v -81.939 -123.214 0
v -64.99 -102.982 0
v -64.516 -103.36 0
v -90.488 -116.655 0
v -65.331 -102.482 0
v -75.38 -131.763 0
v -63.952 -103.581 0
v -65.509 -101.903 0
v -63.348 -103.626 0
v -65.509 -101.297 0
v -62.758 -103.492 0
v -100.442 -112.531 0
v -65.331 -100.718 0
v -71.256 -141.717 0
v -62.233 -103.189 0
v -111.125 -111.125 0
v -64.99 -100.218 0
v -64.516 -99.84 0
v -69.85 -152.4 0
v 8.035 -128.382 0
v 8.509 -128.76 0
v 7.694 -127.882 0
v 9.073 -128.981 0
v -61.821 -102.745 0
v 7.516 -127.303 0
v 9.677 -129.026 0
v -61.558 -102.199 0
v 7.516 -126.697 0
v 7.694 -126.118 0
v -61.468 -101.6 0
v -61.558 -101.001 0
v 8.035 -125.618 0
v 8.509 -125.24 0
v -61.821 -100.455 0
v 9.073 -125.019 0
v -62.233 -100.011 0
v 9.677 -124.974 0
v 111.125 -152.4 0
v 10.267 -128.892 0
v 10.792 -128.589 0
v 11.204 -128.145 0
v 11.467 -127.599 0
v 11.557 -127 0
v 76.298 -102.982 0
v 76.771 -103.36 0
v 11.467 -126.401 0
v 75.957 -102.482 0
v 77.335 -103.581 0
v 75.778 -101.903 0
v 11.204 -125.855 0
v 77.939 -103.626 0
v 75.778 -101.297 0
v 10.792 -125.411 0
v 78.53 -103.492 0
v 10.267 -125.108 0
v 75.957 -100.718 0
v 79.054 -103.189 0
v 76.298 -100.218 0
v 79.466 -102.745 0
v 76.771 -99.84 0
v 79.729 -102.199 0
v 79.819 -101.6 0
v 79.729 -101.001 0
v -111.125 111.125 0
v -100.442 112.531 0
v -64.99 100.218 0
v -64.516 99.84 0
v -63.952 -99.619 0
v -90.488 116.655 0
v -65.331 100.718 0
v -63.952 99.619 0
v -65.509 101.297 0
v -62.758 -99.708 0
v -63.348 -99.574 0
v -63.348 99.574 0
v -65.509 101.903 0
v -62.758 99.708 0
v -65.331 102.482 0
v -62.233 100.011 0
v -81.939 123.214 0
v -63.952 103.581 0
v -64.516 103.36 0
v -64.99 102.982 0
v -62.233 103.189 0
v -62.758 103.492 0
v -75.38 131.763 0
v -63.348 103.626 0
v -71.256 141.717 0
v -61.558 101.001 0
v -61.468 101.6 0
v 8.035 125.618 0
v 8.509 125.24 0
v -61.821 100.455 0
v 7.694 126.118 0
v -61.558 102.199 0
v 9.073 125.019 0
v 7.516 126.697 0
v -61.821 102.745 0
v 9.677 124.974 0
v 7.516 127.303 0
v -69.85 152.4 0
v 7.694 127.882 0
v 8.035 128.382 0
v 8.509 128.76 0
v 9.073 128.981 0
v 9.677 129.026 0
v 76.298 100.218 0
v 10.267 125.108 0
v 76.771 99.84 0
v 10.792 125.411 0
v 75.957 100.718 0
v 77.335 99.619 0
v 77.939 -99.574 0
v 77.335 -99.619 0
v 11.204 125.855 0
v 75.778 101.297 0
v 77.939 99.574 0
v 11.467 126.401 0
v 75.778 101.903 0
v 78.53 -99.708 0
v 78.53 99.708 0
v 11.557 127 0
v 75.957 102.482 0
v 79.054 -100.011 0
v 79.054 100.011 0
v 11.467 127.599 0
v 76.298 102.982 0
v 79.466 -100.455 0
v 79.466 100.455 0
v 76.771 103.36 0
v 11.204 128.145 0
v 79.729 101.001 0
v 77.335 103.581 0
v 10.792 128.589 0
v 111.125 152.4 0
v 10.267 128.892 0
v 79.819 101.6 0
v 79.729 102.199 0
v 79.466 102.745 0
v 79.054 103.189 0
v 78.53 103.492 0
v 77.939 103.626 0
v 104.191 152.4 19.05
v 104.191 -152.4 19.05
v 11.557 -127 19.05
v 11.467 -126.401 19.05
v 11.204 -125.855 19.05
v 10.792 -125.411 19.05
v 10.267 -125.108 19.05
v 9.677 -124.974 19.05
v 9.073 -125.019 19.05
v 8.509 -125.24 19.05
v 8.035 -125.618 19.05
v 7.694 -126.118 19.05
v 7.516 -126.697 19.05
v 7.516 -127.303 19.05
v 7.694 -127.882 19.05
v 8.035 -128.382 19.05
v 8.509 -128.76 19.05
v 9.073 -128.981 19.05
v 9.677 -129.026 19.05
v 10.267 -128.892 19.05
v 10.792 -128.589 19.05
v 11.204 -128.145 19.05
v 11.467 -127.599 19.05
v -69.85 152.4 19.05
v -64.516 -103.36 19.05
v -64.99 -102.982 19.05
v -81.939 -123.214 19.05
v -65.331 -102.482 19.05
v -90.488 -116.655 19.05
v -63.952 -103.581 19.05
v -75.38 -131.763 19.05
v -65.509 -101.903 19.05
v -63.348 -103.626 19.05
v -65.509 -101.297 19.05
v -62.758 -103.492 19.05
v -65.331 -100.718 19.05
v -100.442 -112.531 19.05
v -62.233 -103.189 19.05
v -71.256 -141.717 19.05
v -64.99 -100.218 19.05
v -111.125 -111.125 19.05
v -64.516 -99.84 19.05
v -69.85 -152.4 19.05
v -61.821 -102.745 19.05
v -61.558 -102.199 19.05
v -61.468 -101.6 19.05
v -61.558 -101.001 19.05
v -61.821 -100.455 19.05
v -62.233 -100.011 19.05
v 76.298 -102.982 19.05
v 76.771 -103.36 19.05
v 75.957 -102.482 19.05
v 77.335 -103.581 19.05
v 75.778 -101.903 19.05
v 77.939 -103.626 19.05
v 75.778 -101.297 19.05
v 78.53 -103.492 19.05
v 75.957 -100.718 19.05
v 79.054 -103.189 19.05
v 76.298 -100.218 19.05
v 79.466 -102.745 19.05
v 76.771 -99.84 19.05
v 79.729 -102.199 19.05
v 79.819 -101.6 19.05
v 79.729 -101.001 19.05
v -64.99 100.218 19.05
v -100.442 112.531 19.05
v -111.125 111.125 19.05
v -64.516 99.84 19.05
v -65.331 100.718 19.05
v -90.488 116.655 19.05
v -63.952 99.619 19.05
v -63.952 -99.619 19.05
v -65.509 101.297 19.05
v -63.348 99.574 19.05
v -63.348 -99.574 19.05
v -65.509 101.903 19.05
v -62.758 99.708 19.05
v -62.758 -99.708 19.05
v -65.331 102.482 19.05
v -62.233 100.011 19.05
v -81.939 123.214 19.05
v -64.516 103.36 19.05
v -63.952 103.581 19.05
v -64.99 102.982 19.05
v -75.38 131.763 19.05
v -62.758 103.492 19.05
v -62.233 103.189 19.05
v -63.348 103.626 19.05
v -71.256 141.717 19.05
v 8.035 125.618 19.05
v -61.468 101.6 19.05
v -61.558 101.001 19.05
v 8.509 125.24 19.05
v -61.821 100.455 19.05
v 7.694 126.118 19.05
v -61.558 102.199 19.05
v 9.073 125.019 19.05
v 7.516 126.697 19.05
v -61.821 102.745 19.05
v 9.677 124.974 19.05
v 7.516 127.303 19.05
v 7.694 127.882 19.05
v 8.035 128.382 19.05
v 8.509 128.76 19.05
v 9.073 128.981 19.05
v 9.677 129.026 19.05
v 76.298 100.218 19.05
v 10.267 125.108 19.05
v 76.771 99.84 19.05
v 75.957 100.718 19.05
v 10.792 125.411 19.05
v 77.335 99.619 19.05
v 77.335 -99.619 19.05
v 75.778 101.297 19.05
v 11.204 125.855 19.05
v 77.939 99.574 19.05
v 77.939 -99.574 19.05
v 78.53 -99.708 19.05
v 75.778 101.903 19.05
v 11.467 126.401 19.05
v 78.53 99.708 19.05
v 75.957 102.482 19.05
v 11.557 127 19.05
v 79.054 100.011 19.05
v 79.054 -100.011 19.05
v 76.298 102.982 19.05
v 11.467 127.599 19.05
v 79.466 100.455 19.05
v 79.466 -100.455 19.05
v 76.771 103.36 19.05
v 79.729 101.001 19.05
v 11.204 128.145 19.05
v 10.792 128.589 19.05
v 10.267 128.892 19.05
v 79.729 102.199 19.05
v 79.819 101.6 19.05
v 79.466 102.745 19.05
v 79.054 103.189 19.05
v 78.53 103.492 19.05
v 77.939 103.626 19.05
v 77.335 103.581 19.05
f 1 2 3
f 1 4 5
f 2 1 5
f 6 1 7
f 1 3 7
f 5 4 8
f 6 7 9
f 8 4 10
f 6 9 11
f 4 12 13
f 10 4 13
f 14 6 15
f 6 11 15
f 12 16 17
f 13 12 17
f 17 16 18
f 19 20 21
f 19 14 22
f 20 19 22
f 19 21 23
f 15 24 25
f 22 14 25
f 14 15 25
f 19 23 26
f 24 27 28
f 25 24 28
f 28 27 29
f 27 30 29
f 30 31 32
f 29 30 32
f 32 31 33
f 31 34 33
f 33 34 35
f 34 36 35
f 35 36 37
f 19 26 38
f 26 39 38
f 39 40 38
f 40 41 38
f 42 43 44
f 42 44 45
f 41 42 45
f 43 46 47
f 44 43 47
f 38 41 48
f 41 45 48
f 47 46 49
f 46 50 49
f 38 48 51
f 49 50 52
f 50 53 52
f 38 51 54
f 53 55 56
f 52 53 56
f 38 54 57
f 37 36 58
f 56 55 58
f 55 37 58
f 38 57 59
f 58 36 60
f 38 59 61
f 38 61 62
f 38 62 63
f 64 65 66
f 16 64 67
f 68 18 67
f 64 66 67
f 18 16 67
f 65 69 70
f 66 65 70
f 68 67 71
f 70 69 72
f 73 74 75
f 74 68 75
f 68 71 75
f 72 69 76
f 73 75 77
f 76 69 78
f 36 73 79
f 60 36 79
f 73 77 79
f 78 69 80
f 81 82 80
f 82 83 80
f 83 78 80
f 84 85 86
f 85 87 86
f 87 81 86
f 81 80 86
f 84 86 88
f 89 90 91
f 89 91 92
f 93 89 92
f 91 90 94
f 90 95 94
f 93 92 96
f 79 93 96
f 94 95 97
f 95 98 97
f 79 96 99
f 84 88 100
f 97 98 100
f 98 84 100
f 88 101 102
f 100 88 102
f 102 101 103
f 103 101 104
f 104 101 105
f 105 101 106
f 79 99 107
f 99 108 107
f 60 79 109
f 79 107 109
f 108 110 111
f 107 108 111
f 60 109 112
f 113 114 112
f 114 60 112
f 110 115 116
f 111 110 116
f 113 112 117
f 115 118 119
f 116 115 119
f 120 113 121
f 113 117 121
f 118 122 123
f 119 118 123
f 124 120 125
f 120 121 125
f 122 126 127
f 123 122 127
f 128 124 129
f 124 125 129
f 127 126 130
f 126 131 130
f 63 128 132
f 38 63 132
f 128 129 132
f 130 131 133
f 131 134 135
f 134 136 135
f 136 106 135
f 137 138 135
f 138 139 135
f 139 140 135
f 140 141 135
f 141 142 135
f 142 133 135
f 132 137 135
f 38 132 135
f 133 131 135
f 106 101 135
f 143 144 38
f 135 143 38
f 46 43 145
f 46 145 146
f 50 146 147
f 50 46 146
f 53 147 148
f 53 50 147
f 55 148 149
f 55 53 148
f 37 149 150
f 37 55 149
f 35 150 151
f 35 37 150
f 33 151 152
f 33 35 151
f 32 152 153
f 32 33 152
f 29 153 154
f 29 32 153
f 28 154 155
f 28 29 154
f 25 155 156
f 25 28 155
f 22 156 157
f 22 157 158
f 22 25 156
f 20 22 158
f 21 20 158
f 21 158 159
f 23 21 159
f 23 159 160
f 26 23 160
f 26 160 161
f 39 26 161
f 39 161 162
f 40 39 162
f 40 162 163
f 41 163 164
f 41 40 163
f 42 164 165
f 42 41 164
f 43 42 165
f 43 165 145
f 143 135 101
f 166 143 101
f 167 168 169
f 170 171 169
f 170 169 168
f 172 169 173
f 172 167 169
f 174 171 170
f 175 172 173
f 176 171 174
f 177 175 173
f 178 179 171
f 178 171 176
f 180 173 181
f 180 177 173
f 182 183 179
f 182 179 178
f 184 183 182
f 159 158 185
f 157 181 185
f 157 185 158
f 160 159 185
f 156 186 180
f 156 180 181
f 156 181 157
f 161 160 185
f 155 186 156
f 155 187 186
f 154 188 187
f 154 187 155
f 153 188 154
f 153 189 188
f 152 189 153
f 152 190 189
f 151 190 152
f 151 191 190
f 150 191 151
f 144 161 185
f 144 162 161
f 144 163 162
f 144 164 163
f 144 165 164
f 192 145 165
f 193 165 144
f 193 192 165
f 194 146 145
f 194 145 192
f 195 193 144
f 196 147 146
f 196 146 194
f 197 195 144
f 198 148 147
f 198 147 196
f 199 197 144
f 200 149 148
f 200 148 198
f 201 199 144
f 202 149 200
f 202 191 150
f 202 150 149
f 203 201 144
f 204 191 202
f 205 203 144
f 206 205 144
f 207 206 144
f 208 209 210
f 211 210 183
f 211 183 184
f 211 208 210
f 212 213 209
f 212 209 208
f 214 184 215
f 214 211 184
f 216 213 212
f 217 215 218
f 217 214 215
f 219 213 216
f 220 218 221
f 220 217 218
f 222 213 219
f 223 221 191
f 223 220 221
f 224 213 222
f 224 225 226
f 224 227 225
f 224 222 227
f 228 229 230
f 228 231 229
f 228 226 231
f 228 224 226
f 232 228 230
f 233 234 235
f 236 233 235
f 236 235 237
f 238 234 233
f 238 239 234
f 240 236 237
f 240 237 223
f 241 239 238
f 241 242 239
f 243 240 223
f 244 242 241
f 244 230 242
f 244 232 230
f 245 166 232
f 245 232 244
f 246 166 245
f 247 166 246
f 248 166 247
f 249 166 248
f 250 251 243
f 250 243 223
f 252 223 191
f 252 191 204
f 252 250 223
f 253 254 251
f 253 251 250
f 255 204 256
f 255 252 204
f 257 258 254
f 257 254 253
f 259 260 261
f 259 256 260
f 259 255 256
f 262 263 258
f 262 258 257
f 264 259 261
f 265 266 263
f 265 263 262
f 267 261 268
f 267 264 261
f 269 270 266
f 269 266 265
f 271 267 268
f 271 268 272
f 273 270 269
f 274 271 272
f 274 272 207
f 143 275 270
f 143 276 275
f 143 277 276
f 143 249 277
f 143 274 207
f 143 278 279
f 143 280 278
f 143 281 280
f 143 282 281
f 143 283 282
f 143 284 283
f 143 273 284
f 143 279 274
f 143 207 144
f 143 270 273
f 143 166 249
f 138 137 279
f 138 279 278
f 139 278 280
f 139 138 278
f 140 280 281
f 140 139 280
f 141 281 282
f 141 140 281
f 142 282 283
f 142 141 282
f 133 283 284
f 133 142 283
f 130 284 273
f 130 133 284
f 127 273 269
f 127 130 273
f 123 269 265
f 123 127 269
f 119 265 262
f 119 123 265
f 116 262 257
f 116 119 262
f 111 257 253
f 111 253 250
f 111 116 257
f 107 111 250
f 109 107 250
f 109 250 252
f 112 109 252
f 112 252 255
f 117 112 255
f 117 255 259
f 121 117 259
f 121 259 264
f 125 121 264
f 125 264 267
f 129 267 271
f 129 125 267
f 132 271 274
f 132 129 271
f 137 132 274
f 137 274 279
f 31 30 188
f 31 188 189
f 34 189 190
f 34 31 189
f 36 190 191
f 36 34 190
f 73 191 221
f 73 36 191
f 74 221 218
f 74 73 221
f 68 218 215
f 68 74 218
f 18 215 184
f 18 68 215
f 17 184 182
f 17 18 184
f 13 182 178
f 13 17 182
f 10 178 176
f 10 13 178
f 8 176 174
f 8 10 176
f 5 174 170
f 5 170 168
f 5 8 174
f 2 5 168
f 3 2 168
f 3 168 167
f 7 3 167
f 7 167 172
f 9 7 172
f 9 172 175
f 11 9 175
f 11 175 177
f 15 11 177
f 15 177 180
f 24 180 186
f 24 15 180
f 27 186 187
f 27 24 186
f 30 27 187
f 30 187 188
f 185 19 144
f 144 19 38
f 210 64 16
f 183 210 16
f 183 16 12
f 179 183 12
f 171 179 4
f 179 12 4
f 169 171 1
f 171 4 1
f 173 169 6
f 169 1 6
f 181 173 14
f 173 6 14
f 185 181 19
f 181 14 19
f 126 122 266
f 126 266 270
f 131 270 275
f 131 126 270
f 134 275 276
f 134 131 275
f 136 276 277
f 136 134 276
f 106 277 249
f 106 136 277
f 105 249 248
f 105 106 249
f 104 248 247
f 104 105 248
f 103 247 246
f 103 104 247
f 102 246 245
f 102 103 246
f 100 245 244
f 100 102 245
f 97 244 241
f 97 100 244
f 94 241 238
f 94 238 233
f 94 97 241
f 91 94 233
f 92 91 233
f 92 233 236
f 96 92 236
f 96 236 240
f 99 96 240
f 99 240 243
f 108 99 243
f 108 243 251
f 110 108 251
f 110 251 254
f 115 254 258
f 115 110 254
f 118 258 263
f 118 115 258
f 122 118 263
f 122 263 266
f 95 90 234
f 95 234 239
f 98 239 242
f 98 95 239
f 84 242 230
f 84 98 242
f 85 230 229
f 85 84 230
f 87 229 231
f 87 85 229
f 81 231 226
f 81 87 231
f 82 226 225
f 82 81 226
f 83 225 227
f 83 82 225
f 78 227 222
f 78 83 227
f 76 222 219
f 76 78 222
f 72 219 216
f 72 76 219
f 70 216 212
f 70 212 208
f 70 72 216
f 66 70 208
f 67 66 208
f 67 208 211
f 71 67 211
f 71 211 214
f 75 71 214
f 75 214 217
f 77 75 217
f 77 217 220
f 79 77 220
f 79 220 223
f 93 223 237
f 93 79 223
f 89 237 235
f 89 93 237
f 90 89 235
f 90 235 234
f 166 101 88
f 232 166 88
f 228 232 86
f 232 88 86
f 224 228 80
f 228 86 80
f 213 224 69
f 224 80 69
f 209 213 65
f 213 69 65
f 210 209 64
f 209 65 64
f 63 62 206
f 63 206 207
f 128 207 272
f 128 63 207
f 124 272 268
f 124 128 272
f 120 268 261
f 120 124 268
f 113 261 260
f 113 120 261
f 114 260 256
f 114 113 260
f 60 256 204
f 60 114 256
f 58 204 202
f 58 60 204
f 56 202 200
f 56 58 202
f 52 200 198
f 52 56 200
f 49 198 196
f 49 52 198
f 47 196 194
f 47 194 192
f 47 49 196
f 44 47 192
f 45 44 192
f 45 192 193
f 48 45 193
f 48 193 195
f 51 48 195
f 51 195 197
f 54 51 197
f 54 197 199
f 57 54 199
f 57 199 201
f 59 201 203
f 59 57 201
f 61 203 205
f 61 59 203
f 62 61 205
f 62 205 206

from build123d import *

# Parameters (mm, degrees)
F0_R     = 2.032
F1_DEPTH = 19.05
F3_DEPTH = 304.8


with BuildPart() as f1:
    # F0 (on Top) → F1 (new body)
    with BuildSketch(Plane.XY):
        with BuildLine():
            Line((111.125, 152.4), (-69.85, 152.4))
            ThreePointArc((-69.85, 152.4), (-81.939168, 123.214168), (-111.125, 111.125))
            Line((-111.125, 111.125), (-111.125, -111.125))
            ThreePointArc((-111.125, -111.125), (-81.939168, -123.214168), (-69.85, -152.4))
            Line((-69.85, -152.4), (111.125, -152.4))
            Line((111.125, -152.4), (111.125, 152.4))
        make_face()
        with Locations((-63.5, -101.6)):
            Circle(F0_R, mode=Mode.SUBTRACT)
        with Locations((9.525, -127)):
            Circle(F0_R, mode=Mode.SUBTRACT)
        with Locations((77.7875, -101.6)):
            Circle(F0_R, mode=Mode.SUBTRACT)
        with Locations((-63.5, 101.6)):
            Circle(F0_R, mode=Mode.SUBTRACT)
        with Locations((9.525, 127)):
            Circle(F0_R, mode=Mode.SUBTRACT)
        with Locations((77.7875, 101.6)):
            Circle(F0_R, mode=Mode.SUBTRACT)
    extrude(amount=F1_DEPTH)

    # F2 (on face) → F3 (cut, through all)
    with BuildSketch(Plane.XZ.offset(152.4)):
        Polygon((111.125, 0), (111.125, 19.05), (104.191367, 19.05), align=None)
    extrude(amount=-F3_DEPTH, mode=Mode.SUBTRACT)


solid = f1.part
